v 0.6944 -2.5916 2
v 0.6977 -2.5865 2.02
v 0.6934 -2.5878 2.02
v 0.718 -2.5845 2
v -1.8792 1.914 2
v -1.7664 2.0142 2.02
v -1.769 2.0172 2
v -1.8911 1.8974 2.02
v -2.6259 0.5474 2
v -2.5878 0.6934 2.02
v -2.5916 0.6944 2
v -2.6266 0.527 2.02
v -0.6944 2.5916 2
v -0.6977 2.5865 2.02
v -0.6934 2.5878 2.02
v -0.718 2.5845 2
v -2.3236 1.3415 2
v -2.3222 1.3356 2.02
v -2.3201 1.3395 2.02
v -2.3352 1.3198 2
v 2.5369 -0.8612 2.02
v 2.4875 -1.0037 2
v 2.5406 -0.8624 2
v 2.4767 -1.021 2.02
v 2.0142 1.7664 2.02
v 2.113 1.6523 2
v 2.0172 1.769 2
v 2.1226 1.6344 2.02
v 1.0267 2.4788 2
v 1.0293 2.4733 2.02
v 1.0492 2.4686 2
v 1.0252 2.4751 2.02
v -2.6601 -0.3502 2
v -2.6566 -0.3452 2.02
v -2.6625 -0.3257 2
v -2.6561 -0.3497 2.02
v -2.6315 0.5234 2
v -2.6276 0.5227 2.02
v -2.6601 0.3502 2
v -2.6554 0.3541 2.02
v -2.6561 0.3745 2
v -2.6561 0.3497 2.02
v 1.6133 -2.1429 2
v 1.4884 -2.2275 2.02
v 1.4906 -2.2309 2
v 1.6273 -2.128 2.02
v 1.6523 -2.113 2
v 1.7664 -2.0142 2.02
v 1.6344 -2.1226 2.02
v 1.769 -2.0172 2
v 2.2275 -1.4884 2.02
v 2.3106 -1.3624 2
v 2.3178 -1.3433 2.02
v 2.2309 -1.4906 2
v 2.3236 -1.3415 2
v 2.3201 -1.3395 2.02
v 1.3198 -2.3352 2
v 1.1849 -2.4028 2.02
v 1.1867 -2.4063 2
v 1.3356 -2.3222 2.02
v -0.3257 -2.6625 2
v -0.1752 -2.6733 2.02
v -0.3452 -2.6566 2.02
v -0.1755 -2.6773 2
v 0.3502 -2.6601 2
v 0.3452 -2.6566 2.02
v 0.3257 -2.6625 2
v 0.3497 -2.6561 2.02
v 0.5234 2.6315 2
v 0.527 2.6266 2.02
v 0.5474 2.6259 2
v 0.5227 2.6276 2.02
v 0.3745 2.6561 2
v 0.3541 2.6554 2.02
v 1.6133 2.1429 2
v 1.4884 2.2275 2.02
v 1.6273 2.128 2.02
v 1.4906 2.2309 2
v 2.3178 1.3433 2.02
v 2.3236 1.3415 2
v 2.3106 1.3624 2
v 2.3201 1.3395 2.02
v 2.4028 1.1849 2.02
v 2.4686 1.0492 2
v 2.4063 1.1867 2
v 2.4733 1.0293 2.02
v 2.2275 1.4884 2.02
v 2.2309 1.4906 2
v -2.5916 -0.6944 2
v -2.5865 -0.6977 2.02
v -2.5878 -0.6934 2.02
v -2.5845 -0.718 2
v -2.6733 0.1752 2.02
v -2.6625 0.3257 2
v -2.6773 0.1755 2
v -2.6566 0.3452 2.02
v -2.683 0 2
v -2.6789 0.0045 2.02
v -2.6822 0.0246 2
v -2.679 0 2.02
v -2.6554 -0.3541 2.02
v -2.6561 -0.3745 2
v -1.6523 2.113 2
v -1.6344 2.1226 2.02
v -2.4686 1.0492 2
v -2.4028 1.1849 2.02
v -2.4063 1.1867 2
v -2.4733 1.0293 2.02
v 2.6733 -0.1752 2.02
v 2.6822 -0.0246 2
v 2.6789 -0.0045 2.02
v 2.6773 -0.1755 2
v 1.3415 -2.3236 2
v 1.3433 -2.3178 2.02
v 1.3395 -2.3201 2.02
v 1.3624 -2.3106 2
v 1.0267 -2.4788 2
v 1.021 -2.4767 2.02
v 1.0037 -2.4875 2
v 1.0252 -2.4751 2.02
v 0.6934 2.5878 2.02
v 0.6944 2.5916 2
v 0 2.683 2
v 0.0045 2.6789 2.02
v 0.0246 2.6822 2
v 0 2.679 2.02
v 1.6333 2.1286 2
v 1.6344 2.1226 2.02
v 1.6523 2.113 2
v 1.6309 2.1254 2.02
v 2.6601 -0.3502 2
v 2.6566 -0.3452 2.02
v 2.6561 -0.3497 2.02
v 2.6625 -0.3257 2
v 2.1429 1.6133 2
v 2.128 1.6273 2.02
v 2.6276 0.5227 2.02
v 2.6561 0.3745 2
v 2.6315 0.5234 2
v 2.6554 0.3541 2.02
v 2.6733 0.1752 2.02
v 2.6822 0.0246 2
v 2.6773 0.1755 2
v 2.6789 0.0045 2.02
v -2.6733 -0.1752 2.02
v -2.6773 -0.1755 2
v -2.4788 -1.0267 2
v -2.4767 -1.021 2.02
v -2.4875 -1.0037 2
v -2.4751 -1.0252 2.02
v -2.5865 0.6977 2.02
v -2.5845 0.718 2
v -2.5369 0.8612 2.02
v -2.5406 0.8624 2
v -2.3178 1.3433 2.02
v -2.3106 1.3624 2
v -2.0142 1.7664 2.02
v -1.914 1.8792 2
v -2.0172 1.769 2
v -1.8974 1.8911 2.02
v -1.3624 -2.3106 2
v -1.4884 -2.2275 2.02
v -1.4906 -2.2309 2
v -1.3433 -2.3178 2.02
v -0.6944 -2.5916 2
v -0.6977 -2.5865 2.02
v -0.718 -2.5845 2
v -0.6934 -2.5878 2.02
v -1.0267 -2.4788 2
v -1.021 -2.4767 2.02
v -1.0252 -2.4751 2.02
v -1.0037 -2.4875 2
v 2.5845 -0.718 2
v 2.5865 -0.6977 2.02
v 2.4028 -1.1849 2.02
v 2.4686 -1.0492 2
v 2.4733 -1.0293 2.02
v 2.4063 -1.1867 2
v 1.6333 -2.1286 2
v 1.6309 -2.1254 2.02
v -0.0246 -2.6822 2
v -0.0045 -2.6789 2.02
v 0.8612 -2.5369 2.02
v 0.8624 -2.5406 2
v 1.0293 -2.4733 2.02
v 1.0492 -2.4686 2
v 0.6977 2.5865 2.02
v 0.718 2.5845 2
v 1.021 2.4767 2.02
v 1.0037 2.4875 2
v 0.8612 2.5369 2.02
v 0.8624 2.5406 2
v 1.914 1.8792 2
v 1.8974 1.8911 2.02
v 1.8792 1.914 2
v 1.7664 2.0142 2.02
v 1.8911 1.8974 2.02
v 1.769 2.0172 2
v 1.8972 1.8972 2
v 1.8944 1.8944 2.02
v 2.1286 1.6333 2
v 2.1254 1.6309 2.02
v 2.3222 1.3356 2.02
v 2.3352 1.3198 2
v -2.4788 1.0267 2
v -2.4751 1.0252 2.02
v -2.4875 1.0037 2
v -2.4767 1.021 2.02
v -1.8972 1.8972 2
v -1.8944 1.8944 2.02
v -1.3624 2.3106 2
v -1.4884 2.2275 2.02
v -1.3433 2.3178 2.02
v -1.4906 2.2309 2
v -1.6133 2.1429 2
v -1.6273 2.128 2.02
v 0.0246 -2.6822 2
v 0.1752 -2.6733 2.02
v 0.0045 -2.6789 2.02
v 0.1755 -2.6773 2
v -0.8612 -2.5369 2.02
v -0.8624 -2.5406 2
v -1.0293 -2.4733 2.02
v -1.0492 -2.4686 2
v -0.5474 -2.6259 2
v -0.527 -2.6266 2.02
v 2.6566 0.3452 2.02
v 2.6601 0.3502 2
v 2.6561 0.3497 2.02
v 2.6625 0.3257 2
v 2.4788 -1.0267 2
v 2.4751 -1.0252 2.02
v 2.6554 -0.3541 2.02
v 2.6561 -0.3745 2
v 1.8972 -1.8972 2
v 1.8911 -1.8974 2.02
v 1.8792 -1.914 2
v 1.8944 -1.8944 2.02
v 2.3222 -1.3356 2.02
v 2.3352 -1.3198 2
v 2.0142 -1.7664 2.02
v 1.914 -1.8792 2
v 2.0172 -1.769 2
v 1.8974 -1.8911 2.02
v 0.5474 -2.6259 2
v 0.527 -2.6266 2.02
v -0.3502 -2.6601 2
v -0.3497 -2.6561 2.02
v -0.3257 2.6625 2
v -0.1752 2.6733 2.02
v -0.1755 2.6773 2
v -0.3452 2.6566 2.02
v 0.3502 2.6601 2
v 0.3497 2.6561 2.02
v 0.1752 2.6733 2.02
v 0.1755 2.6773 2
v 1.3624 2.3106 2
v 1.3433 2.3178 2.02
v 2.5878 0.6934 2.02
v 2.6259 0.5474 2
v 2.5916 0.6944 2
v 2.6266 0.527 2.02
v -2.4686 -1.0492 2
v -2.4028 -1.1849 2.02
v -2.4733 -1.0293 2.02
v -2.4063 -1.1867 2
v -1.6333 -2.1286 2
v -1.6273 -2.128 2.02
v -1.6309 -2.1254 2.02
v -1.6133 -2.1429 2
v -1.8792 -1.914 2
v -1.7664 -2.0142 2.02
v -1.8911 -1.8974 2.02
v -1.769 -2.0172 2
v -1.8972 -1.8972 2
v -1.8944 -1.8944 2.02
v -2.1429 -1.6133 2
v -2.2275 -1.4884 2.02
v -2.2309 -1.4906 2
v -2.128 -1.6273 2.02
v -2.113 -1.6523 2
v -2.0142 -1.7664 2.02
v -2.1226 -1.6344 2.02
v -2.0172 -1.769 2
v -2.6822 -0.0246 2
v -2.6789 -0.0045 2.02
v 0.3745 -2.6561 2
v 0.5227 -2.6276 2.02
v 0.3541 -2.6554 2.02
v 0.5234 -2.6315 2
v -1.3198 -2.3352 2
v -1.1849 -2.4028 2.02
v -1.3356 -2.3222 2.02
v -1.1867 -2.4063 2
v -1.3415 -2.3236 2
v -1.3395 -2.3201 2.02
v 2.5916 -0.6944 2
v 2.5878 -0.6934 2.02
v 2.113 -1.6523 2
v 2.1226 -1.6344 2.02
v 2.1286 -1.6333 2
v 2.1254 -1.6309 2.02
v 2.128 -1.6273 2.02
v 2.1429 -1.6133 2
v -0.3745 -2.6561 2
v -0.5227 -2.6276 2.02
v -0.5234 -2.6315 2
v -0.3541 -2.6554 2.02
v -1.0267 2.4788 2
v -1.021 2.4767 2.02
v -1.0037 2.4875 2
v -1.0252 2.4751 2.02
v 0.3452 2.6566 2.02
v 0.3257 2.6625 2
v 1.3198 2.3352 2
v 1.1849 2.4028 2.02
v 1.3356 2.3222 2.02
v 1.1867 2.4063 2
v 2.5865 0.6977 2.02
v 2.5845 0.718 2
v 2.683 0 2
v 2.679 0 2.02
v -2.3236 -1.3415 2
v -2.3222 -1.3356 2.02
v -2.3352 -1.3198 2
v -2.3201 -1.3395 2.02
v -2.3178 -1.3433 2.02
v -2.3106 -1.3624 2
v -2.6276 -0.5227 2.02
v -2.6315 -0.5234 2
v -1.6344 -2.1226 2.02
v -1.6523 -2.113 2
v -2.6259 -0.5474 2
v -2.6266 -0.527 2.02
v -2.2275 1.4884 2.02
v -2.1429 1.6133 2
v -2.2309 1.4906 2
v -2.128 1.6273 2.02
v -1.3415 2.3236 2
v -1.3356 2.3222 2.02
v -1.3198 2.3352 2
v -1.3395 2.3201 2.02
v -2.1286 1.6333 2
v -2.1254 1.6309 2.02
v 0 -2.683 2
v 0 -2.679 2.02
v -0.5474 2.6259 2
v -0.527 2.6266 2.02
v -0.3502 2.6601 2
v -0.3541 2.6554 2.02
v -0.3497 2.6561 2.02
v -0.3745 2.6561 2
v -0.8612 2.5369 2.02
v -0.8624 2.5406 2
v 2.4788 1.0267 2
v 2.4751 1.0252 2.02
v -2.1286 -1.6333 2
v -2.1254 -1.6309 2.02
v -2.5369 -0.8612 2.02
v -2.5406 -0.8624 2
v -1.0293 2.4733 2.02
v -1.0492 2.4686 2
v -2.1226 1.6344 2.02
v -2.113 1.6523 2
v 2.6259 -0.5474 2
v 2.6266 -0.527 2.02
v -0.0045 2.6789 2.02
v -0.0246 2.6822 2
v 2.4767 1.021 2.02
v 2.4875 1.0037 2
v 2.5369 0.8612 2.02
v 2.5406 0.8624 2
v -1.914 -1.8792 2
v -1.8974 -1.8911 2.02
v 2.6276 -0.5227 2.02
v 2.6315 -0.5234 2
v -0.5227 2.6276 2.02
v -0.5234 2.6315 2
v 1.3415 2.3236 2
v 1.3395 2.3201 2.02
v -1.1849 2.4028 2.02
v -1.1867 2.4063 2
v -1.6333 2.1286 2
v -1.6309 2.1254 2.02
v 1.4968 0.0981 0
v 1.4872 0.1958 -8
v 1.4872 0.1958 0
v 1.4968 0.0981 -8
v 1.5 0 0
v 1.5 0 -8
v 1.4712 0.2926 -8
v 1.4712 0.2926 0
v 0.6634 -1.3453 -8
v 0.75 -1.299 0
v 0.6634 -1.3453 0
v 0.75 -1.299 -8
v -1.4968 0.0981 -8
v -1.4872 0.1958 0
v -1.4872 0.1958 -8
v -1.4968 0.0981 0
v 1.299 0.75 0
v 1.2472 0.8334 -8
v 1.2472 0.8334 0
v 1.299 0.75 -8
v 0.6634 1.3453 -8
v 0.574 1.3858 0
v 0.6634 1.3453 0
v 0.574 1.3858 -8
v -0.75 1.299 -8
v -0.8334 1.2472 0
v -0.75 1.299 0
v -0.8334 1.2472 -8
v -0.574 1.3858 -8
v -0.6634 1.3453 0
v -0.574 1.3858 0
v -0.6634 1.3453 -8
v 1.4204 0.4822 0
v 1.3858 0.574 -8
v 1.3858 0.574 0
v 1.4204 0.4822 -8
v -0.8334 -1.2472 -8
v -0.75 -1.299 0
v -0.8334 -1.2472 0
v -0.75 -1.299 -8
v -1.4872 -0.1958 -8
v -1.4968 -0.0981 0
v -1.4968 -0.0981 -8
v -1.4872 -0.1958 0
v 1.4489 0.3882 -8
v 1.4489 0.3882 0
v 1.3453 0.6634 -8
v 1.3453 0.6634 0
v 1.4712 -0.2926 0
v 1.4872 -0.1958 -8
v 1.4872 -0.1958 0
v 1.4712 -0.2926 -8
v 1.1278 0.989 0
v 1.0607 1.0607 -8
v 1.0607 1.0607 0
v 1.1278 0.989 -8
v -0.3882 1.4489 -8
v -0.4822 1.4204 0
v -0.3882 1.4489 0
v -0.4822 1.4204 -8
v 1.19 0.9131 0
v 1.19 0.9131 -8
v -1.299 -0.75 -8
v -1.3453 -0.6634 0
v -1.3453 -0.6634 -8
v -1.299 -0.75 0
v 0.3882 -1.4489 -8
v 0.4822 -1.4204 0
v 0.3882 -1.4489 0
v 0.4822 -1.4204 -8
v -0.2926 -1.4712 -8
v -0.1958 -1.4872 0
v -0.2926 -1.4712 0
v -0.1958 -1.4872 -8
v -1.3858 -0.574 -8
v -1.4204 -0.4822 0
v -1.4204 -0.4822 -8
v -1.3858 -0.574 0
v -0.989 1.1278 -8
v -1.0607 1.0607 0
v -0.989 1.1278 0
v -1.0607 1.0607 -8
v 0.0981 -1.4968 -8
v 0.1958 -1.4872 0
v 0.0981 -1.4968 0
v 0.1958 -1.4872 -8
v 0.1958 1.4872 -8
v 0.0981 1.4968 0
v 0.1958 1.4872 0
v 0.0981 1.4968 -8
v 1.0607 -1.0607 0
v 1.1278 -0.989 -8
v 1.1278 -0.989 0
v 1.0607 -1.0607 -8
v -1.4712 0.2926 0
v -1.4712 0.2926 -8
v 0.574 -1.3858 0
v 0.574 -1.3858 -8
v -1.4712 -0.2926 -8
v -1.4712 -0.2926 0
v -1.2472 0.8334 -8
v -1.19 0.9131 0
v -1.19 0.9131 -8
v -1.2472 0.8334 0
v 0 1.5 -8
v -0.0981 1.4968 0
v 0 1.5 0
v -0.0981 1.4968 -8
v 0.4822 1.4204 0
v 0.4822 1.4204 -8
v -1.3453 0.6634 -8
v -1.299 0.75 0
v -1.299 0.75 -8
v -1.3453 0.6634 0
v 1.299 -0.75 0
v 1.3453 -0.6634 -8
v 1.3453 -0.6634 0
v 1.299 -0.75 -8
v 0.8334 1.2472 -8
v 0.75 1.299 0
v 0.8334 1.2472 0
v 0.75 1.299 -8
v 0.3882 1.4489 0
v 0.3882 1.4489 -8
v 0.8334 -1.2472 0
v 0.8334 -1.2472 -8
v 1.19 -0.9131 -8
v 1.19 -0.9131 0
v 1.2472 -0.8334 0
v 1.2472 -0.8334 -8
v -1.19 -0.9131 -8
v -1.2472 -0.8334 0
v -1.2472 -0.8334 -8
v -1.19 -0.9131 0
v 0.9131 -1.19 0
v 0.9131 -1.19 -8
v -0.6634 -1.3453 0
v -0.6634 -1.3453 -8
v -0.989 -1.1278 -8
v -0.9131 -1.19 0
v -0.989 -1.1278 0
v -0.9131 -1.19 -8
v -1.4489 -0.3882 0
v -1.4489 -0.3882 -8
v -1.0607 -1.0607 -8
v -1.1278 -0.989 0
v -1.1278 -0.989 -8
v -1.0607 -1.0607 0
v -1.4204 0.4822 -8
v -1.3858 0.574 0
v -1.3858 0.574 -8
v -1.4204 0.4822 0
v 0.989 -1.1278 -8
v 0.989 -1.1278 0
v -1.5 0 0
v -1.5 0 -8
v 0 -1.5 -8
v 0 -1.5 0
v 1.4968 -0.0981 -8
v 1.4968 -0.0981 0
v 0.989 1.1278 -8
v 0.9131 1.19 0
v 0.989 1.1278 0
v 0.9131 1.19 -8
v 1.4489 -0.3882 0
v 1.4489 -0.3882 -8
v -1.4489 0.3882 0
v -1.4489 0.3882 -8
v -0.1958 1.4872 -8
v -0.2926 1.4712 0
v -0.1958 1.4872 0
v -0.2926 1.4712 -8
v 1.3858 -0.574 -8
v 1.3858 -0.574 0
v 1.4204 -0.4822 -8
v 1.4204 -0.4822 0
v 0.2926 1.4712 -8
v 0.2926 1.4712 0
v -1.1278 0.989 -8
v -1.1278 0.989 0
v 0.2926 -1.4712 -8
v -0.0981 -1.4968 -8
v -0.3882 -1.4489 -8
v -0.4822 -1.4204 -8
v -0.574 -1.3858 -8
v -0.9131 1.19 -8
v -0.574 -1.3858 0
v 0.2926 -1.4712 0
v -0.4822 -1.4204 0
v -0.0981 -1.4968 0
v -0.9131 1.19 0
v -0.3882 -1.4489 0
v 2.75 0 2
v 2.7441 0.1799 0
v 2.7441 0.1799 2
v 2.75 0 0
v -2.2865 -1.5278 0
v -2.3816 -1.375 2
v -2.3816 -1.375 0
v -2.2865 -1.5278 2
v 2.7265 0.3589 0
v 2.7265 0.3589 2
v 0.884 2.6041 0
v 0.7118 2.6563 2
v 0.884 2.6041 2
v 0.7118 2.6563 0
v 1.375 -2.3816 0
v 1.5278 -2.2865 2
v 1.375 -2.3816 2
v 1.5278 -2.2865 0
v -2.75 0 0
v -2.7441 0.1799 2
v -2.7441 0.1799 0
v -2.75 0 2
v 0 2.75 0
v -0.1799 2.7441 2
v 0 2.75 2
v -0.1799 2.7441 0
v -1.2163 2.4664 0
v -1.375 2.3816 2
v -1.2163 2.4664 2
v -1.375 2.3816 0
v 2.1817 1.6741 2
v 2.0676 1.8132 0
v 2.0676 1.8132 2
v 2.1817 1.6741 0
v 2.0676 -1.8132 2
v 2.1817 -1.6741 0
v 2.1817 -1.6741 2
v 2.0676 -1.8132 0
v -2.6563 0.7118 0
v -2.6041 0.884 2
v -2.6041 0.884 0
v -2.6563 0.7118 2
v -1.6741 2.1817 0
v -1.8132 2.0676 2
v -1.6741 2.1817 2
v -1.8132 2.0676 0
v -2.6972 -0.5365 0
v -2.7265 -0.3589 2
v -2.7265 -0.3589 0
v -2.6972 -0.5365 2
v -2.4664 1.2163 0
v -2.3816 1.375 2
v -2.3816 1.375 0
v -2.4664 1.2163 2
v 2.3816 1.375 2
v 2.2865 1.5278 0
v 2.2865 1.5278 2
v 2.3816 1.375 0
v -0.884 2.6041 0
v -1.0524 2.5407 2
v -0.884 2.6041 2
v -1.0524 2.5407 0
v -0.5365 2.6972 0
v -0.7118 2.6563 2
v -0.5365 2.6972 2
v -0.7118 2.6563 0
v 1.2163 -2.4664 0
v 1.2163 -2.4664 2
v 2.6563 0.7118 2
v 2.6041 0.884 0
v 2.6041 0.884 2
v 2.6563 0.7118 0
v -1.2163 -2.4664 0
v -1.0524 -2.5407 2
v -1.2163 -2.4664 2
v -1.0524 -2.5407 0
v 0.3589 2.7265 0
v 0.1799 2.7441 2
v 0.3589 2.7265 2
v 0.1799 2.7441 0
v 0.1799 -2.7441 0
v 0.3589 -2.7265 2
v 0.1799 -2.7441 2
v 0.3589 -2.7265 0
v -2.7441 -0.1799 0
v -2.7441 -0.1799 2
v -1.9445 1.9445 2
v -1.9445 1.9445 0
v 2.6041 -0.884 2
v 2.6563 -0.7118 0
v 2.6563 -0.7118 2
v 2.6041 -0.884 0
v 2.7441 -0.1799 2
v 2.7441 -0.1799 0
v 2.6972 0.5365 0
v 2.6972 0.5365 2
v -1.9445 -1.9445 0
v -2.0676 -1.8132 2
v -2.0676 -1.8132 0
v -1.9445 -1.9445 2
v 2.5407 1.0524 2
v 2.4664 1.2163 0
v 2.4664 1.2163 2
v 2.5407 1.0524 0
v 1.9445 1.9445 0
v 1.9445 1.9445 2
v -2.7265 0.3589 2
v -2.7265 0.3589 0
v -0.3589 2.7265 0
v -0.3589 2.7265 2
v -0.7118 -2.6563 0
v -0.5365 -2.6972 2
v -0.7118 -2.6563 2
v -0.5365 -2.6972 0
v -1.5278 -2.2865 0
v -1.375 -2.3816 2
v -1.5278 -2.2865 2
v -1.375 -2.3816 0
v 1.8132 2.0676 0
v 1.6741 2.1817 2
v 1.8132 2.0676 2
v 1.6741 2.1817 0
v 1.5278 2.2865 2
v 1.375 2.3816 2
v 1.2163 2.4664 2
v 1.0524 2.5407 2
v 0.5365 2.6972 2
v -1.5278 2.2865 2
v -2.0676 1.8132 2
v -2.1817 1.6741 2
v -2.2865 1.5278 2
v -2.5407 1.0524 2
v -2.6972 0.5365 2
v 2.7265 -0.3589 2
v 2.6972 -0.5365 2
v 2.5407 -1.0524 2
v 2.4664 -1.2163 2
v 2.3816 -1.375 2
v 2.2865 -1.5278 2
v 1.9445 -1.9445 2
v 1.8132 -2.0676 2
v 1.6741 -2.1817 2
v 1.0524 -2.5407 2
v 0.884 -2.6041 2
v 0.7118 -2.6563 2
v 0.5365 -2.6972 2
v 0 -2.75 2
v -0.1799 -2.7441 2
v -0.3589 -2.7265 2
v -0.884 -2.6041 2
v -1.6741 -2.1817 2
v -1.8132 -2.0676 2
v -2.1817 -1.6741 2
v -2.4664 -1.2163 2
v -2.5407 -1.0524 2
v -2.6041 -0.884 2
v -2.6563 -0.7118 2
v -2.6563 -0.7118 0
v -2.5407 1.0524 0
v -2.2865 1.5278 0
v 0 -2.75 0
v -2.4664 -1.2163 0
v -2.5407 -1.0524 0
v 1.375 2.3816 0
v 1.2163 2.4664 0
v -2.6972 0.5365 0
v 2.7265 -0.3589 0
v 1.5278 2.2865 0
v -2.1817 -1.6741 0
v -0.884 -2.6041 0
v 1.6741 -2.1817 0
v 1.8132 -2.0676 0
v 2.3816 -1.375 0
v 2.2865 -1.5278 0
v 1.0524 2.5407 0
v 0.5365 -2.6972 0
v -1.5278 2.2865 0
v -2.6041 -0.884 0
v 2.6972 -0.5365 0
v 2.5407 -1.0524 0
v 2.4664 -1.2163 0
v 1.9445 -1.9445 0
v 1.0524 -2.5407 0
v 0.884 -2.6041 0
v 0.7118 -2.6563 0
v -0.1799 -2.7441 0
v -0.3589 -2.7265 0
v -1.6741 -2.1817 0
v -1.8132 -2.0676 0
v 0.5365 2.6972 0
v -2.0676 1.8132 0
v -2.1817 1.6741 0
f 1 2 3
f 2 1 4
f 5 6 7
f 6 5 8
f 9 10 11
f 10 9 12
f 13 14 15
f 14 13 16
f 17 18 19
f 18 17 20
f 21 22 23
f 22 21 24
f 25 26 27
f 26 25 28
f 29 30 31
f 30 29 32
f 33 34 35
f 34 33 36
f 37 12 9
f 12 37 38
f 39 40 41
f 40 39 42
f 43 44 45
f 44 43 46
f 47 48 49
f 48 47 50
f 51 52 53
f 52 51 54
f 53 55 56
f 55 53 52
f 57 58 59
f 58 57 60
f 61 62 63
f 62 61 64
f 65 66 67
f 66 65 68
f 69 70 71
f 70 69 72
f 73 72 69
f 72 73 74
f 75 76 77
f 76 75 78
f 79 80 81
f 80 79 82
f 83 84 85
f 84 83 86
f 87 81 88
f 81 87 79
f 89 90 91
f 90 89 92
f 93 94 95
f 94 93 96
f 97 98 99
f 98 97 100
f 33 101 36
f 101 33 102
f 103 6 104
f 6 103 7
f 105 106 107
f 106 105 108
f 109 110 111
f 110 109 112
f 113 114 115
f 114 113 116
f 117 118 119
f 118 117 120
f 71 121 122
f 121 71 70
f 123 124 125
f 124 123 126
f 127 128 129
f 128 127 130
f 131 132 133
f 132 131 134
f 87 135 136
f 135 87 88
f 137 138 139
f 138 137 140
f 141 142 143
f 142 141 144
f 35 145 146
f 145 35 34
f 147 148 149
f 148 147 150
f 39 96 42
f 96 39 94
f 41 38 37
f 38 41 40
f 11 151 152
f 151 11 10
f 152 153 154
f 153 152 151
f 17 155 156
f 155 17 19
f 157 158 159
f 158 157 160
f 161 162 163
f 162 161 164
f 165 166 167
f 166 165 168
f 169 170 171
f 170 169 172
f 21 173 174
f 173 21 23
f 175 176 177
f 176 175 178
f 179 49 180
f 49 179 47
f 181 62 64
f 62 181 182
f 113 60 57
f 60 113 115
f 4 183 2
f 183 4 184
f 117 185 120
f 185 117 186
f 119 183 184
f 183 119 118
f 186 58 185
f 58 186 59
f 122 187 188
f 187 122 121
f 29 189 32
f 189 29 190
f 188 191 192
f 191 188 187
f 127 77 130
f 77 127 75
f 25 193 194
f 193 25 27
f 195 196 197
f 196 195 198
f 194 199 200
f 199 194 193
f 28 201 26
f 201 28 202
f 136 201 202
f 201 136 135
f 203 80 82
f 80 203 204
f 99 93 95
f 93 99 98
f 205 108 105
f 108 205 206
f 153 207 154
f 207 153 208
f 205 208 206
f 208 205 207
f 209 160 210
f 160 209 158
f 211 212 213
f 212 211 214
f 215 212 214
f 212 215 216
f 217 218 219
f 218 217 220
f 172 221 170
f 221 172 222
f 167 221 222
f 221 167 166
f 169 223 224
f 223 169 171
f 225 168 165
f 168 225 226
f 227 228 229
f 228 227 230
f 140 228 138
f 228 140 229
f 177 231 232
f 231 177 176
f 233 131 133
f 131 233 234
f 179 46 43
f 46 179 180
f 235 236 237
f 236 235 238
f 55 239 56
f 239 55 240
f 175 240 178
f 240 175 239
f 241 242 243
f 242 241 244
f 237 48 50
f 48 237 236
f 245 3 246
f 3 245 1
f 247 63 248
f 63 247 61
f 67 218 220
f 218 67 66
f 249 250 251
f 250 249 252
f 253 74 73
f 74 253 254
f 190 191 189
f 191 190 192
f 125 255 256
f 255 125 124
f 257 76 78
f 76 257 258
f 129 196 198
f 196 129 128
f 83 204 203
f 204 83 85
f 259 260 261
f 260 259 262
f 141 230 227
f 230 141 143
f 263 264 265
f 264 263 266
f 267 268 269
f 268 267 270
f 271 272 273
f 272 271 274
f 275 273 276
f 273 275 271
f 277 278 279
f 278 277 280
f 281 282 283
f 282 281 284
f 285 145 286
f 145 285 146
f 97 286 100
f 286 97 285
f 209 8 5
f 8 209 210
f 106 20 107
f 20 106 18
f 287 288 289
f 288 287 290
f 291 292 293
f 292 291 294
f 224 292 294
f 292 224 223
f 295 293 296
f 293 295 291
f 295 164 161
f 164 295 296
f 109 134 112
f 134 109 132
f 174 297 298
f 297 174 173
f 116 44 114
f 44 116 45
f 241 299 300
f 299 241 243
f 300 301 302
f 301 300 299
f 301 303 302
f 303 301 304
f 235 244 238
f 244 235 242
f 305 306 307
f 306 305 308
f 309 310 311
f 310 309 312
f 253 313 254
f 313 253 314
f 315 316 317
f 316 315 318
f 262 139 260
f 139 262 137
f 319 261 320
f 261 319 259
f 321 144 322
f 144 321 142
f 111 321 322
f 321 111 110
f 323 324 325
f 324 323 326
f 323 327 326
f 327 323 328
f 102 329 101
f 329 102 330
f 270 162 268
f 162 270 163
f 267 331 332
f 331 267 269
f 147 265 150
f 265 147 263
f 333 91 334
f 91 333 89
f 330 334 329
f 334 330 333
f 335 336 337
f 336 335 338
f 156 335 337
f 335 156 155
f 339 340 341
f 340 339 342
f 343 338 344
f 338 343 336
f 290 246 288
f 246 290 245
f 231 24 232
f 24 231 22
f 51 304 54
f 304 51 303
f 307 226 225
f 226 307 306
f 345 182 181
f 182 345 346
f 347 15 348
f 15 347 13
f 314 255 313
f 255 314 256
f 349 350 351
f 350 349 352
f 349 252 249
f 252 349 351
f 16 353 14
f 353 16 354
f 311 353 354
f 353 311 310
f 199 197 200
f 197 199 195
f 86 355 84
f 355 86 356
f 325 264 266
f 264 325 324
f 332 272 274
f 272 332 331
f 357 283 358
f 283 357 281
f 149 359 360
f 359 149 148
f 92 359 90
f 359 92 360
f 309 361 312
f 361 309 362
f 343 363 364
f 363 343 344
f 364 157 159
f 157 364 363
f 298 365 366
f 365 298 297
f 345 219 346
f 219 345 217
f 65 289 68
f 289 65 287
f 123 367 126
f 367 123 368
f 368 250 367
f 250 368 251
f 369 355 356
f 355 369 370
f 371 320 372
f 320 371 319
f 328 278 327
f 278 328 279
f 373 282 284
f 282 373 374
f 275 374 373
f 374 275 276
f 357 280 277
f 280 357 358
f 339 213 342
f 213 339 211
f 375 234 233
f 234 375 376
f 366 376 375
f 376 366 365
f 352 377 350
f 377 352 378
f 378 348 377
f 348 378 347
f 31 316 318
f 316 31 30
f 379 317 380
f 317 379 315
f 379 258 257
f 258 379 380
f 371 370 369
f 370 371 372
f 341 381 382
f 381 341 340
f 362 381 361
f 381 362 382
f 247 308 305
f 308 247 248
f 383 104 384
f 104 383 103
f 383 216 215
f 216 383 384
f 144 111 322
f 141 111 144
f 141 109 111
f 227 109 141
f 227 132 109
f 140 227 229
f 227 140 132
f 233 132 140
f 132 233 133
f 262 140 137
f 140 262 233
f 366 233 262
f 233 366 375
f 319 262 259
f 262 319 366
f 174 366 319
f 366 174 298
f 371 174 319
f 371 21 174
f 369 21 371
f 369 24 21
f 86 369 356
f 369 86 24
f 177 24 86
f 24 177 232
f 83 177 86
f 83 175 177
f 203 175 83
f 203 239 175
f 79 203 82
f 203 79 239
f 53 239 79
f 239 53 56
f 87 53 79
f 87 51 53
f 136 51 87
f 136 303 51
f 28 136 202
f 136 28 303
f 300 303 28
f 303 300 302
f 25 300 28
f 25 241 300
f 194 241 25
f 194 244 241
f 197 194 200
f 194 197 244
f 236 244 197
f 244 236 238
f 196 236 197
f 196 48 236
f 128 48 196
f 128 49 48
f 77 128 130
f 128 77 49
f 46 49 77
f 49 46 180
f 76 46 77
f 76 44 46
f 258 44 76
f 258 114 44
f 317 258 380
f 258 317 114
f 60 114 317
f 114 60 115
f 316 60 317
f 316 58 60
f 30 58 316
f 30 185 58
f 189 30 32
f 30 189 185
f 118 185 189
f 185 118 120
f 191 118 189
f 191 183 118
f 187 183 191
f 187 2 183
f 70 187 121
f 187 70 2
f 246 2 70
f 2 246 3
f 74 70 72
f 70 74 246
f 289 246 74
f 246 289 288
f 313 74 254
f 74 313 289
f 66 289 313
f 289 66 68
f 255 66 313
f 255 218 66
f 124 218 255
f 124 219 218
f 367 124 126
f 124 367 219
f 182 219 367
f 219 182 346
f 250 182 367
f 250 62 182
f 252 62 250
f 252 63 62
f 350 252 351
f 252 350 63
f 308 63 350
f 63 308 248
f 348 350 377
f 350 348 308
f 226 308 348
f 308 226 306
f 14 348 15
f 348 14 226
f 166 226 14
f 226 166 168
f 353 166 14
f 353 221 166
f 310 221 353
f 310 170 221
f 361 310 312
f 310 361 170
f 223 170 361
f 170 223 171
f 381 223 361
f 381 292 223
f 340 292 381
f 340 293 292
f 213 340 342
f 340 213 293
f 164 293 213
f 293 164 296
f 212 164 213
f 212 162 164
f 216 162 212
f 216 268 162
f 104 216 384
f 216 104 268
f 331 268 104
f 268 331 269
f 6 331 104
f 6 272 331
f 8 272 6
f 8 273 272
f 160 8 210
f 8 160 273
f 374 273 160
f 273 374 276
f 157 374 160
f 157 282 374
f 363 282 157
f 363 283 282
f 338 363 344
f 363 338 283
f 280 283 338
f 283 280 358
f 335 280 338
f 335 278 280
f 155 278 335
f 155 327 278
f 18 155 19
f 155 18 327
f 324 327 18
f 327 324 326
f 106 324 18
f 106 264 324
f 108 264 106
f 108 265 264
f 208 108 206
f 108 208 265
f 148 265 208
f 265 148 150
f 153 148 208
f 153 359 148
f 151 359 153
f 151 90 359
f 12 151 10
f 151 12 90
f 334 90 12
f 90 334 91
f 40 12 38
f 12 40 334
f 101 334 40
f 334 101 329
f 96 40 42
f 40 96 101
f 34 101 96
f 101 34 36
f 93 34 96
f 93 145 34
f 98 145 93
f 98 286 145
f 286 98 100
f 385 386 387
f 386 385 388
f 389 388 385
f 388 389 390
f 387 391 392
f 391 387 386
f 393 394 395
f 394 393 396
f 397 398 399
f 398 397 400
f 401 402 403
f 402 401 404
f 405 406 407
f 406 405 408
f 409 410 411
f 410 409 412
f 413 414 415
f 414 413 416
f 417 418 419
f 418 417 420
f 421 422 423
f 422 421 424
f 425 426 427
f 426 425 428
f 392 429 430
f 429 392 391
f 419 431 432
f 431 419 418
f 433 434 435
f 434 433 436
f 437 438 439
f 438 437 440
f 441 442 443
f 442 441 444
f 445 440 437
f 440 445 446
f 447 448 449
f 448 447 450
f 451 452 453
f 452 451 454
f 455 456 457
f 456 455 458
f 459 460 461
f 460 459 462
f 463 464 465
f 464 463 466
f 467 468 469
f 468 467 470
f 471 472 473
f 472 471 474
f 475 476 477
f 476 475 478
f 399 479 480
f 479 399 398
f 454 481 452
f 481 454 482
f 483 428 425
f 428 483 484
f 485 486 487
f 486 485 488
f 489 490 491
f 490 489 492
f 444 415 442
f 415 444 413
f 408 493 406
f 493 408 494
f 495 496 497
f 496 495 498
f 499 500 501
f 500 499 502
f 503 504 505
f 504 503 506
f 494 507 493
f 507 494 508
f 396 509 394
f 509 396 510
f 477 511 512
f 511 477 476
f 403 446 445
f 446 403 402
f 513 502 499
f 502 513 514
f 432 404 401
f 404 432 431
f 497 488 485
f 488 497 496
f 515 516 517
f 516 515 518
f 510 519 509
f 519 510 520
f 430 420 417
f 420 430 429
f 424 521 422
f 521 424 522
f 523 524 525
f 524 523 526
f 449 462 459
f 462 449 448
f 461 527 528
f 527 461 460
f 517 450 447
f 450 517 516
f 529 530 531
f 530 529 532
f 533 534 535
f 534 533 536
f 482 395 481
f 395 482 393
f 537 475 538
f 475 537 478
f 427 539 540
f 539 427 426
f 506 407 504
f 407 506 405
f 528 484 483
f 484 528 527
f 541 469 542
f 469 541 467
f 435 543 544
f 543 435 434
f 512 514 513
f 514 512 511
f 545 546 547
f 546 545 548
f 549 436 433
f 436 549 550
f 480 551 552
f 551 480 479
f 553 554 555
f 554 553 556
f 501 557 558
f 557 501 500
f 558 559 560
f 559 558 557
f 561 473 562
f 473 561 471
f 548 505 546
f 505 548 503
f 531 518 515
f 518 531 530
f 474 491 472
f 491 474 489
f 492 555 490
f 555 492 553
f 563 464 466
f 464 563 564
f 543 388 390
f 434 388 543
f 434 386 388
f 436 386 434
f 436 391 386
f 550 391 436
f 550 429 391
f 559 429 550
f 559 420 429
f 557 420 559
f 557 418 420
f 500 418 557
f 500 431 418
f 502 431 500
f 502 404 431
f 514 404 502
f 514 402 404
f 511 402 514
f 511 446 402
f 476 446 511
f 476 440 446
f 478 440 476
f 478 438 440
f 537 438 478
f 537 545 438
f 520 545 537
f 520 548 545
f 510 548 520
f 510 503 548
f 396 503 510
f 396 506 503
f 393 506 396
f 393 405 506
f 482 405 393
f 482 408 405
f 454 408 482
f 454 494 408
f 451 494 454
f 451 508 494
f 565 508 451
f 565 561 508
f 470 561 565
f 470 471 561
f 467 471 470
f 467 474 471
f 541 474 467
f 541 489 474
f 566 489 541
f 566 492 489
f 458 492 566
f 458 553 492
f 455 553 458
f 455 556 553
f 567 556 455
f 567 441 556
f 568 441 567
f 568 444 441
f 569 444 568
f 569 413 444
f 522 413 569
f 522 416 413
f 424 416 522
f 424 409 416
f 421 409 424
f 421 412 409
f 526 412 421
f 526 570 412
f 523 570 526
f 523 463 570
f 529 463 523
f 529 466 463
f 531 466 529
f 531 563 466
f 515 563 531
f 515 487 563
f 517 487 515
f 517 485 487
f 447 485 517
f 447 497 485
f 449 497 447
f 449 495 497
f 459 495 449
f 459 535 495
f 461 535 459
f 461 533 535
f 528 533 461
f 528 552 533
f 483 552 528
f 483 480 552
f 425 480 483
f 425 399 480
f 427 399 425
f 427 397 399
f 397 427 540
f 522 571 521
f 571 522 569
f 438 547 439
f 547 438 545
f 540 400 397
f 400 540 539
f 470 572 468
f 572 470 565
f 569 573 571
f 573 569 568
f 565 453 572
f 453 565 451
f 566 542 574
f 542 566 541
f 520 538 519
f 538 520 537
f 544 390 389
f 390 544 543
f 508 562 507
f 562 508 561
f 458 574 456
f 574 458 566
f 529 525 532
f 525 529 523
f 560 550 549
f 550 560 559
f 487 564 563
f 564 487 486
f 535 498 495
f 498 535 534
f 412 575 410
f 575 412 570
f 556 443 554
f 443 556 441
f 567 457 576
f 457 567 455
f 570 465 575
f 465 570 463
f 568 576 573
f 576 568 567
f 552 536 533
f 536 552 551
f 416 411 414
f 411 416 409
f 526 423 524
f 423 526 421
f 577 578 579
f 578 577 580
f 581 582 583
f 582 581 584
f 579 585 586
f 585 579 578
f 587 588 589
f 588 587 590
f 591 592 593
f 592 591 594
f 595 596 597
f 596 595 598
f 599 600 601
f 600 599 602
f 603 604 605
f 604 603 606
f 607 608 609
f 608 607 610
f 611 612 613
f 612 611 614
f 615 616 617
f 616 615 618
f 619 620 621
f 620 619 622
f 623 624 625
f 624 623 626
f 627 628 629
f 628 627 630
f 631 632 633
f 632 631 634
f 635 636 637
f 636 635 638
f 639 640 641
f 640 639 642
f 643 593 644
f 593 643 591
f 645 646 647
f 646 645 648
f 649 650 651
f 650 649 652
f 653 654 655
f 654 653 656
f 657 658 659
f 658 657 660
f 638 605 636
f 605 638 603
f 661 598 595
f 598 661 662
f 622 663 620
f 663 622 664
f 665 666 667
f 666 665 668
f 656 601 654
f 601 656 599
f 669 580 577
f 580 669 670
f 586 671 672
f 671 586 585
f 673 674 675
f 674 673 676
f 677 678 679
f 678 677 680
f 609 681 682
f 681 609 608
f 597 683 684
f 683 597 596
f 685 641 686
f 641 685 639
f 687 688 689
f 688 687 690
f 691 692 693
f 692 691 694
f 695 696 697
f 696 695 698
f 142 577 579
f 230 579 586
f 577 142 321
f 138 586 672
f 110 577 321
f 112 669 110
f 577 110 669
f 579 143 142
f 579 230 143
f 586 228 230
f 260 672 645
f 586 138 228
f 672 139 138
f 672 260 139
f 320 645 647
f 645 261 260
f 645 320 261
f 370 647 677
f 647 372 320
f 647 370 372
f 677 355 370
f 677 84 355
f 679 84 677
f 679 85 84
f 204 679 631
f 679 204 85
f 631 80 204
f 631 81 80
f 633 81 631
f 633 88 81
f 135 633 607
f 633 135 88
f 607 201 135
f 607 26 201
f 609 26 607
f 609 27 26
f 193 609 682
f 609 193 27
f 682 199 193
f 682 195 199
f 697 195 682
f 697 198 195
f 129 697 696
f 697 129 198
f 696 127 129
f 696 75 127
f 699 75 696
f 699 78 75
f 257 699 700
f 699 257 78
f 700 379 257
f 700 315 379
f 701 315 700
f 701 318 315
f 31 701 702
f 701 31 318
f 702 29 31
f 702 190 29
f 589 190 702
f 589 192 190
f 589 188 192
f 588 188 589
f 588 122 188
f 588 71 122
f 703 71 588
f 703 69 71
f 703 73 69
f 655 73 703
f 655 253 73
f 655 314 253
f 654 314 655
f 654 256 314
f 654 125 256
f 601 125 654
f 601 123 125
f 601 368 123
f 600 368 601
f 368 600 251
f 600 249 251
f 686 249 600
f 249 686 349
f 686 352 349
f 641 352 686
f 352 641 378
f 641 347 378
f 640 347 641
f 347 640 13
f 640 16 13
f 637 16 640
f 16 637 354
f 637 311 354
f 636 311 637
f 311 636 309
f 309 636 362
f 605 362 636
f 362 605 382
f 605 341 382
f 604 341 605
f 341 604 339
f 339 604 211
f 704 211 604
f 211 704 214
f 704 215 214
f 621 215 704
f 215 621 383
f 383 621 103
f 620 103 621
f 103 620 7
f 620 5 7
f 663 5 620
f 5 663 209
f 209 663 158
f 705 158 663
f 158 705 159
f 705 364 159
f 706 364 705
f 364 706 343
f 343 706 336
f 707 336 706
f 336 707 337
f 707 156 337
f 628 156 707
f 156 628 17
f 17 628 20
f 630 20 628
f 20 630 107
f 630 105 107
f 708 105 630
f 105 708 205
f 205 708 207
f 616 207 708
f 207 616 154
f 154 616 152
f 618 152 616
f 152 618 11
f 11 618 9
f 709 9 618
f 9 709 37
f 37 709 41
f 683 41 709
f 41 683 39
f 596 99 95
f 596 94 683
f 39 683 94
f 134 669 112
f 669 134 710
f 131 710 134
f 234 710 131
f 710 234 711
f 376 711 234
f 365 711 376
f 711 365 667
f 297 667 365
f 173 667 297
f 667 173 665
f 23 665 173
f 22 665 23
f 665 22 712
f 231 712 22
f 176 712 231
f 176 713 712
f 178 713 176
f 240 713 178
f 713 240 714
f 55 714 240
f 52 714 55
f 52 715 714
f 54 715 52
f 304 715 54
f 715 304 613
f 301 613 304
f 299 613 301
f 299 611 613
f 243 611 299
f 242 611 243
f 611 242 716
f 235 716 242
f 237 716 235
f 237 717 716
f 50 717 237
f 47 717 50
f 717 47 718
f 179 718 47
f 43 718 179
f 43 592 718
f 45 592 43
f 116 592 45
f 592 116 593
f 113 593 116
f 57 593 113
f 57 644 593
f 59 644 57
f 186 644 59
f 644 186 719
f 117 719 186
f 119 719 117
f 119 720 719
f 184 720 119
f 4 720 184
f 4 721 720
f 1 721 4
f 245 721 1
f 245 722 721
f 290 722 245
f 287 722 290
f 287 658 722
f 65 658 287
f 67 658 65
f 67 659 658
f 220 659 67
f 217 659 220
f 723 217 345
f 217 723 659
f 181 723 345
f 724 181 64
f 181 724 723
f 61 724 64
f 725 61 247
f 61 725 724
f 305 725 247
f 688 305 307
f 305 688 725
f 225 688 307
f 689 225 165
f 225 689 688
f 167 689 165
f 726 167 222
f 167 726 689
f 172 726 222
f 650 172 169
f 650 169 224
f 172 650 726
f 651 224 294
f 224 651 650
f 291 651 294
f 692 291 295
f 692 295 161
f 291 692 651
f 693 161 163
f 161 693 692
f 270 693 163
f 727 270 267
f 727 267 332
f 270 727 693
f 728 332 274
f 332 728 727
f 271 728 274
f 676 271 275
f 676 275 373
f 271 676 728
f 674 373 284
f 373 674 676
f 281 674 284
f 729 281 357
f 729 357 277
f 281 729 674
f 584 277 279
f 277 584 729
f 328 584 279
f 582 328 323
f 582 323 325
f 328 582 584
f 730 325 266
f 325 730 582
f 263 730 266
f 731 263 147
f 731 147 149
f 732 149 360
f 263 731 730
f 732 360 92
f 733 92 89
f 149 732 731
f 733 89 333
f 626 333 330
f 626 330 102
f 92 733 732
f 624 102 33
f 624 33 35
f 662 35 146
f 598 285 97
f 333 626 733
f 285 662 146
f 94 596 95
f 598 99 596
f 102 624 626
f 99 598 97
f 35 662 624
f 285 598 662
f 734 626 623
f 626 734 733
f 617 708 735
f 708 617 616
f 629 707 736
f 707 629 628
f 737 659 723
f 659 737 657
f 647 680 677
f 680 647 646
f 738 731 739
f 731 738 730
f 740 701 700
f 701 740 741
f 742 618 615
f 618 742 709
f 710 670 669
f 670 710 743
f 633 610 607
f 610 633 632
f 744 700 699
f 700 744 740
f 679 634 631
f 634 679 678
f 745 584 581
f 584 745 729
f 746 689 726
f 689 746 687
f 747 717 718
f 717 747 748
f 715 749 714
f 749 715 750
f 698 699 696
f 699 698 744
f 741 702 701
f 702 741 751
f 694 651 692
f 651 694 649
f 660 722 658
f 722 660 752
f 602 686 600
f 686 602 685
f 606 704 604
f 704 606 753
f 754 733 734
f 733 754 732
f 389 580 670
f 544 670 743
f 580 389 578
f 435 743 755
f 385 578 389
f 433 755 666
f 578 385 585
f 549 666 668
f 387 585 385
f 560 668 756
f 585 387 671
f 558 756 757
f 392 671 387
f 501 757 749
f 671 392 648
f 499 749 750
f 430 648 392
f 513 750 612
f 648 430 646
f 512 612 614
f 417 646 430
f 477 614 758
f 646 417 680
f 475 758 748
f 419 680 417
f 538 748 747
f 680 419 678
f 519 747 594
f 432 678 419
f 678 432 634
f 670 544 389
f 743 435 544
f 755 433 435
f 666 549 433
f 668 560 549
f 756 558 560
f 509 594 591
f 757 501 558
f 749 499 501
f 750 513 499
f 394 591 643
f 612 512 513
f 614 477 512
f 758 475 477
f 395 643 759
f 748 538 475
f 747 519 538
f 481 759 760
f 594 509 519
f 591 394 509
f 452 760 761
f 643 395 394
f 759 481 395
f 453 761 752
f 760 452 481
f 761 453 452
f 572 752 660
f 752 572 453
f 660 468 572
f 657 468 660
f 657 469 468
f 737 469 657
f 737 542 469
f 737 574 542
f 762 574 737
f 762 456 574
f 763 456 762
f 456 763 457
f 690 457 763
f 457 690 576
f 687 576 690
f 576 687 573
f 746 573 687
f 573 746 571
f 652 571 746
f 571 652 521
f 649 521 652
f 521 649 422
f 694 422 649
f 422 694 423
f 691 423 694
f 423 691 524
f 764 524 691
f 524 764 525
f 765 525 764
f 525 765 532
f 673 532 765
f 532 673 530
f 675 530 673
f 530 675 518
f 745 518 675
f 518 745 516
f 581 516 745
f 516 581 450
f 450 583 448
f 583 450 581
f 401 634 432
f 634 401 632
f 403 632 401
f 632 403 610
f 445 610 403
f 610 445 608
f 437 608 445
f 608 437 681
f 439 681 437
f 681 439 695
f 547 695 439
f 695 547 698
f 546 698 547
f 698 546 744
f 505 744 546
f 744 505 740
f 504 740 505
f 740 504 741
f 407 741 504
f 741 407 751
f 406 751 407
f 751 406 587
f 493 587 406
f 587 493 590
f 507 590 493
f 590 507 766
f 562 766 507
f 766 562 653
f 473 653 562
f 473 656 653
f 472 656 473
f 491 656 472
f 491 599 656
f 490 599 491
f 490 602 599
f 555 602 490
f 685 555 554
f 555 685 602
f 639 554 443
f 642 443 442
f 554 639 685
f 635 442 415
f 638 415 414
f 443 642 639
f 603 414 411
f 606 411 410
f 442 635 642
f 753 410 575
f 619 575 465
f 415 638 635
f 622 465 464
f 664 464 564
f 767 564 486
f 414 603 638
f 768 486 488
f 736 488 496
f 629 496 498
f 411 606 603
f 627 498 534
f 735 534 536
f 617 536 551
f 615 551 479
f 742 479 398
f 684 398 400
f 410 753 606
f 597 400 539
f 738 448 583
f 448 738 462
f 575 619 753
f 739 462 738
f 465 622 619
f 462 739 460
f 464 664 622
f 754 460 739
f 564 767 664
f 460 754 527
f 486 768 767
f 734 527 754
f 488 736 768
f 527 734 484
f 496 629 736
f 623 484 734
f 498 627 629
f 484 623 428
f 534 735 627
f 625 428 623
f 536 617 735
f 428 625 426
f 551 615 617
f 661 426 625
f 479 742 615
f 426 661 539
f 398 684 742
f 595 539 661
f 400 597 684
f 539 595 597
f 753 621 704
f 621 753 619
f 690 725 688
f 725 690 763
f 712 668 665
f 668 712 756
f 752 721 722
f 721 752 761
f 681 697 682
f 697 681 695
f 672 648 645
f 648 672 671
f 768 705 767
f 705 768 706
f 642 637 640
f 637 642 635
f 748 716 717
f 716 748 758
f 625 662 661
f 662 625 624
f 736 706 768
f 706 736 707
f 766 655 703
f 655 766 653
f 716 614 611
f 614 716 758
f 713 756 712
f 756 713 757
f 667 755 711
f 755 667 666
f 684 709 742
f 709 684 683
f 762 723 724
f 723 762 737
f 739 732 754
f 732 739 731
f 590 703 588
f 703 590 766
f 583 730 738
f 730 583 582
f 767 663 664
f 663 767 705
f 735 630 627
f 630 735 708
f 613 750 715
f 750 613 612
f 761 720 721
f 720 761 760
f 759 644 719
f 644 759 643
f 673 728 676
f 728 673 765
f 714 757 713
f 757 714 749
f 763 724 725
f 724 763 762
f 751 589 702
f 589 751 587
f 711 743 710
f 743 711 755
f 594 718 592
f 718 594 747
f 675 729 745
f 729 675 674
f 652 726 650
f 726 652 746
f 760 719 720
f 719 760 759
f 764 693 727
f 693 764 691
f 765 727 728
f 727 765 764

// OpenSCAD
// Pan head screw: 3.0mm shaft diameter, 5.5mm head diameter, 2.0mm head height, 10mm overall length
// Single connected solid (no extra parts)

$fn = 96;

shaft_diameter = 3.0;
head_diameter  = 5.5;
head_height    = 2.0;
overall_length = 10.0;

eps = 0.02;

// Simple pan head profile (cylindrical head with a slight dome)
module pan_head_screw(d_shaft=3, d_head=5.5, h_head=2, L=10) {
    shaft_len = L - h_head;

    union() {
        // Shaft (under-head to tip)
        translate([0, 0, -shaft_len])
            cylinder(h=shaft_len + eps, d=d_shaft);

        // Head base cylinder (full head height)
        cylinder(h=h_head, d=d_head);

        // Slight dome on top of head (kept within head height)
        // Dome height is a fraction of head height; overlaps into head for watertight union.
        dome_h = min(0.6, h_head * 0.35);
        translate([0, 0, h_head - dome_h])
            intersection() {
                // Sphere creates dome; intersection keeps it from bulging below the dome start plane
                sphere(d=d_head);
                translate([0, 0, 0])
                    cylinder(h=dome_h + eps, d=d_head);
            }
    }
}

pan_head_screw(shaft_diameter, head_diameter, head_height, overall_length);
